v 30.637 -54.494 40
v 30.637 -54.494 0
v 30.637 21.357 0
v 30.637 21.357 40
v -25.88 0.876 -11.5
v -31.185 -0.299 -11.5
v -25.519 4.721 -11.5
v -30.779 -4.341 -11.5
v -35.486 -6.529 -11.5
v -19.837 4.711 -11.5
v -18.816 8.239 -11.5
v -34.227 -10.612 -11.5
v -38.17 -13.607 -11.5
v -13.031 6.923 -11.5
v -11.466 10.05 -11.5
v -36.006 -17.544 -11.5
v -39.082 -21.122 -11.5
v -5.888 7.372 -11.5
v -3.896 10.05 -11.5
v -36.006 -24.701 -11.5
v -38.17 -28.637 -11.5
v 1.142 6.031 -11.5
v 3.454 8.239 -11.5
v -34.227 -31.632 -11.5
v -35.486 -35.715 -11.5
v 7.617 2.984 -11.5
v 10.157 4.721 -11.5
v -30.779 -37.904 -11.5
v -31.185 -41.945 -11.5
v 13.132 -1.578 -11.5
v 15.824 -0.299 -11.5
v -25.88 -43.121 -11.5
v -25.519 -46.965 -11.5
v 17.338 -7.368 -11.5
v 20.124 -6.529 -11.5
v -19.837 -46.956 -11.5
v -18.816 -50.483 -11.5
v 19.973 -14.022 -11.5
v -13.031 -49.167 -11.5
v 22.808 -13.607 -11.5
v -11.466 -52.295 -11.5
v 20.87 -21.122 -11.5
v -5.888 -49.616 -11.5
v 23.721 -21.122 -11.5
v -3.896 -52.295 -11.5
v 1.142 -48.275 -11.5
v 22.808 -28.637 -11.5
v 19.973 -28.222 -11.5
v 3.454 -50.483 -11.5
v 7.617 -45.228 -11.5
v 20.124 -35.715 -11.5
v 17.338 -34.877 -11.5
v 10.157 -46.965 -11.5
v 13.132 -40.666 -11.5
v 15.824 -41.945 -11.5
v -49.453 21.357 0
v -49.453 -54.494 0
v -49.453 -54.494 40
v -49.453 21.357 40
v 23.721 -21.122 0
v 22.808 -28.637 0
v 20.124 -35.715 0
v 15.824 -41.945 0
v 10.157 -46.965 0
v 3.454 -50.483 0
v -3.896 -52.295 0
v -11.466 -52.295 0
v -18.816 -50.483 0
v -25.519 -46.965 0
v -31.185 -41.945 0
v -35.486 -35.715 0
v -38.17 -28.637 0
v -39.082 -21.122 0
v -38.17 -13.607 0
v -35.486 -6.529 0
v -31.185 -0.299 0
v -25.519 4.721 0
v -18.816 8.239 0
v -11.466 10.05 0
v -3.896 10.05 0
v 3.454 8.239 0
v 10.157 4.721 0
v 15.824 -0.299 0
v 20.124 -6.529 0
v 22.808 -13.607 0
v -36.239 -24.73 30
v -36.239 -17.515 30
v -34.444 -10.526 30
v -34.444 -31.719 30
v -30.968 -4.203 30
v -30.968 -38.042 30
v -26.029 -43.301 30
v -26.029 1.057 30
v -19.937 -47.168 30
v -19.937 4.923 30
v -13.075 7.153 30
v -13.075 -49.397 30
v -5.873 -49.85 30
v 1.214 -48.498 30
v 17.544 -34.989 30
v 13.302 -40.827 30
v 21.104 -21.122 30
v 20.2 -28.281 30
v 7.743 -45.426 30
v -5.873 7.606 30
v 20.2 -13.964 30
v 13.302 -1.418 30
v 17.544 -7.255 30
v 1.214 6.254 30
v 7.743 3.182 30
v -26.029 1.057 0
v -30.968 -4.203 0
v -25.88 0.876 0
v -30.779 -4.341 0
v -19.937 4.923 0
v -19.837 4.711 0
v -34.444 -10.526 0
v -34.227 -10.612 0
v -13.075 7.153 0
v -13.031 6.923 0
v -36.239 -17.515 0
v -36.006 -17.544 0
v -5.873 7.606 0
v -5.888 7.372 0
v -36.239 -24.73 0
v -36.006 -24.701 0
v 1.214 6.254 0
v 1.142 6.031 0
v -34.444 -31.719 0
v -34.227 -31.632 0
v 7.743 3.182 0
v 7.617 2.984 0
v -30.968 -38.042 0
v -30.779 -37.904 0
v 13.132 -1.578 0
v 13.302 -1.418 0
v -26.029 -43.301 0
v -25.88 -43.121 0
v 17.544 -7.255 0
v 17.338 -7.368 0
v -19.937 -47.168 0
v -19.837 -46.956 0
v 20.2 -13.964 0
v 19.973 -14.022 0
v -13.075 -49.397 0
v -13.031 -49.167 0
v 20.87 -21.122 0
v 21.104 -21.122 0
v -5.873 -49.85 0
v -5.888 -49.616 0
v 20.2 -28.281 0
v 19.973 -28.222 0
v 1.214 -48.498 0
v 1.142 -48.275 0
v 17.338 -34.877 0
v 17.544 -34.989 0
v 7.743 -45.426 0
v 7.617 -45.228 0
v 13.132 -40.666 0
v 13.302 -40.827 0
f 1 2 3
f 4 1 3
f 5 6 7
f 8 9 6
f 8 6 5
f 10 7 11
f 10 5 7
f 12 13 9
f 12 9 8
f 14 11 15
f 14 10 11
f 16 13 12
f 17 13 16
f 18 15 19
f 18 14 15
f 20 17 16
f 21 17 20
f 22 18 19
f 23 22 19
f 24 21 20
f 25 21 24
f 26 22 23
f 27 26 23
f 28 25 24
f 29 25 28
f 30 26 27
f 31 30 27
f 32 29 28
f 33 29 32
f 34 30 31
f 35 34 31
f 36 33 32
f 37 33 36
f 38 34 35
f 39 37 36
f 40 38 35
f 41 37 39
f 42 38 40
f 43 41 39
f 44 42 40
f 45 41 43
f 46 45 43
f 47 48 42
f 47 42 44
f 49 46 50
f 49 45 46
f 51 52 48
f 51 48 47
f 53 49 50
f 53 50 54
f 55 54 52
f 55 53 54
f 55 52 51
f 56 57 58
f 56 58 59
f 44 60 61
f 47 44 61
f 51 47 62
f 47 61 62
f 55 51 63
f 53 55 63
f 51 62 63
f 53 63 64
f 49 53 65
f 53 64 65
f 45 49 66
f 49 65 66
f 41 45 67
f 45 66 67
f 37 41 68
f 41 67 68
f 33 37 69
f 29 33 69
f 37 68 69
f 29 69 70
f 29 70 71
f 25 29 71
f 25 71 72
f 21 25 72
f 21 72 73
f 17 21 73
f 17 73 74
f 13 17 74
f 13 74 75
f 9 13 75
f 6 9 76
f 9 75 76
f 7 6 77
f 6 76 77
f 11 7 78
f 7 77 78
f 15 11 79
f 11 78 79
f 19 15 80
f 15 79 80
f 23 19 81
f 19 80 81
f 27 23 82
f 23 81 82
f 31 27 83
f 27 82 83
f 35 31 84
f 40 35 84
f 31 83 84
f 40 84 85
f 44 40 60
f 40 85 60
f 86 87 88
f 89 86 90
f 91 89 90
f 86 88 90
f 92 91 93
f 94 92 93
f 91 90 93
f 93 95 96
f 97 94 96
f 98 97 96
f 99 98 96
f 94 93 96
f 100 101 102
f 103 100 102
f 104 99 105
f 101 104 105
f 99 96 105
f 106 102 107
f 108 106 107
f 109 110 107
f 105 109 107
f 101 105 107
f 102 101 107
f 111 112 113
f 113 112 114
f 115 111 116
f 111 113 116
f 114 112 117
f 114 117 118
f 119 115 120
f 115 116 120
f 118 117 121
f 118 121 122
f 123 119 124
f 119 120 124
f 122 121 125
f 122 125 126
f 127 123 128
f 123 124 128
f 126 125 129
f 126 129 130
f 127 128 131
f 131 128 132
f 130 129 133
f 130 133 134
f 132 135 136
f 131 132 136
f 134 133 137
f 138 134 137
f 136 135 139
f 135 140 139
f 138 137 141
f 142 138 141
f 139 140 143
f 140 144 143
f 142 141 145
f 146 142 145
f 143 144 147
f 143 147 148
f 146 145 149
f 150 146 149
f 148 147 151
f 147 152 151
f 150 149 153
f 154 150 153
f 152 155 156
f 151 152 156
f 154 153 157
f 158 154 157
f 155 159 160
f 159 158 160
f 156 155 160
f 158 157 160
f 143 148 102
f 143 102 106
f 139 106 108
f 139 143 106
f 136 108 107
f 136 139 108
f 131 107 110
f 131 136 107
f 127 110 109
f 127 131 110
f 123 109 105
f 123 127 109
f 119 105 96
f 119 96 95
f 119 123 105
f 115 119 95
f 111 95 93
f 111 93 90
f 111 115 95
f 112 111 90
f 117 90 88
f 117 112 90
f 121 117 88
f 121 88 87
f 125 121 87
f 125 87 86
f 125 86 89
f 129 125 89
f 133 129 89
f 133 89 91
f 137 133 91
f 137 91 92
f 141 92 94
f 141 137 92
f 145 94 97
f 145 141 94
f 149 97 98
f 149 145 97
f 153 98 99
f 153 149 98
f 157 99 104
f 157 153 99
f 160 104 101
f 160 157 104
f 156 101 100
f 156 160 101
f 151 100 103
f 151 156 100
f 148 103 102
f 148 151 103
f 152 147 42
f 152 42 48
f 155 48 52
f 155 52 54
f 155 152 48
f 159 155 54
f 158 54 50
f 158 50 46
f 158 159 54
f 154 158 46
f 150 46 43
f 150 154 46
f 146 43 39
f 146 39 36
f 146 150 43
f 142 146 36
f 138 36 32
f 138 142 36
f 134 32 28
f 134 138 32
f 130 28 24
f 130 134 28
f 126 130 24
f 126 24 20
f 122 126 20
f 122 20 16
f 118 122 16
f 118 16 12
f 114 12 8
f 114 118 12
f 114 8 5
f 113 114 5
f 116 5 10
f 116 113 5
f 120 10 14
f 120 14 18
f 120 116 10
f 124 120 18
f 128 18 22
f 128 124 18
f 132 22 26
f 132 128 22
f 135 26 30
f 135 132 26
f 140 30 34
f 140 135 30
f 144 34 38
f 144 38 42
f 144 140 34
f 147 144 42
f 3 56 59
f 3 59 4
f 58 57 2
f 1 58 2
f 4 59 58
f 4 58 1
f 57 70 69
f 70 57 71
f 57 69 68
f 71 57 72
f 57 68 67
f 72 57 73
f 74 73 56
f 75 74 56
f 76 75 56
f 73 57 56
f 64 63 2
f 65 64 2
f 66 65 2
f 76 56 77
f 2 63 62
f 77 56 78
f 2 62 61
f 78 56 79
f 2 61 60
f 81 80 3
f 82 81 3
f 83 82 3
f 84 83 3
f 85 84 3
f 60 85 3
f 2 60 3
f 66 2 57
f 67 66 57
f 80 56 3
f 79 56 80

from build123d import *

# Parameters (mm, degrees)
F0_W     = 80.089839
F0_H     = 75.850955
F1_DEPTH = 40
F2_R     = 28.784991
F3_DEPTH = 30
F4_R     = 31.401524
F4_R_2   = 28.550589
F5_DEPTH = 11.5


with BuildPart() as f1:
    # F0 (on Top) → F1 (new body)
    with BuildSketch(Plane.XY):
        with Locations((-9.407865, -16.568296)):
            Rectangle(F0_W, F0_H)
    extrude(amount=F1_DEPTH)

    # F2 (on Top) → F3 (cut)
    with BuildSketch(Plane.XY):
        with Locations((-7.680858, -21.122221)):
            Circle(F2_R)
    extrude(amount=F3_DEPTH, mode=Mode.SUBTRACT)

    # F4 (on face) → F5 (join)
    with BuildSketch(Plane(origin=(0, 0, 0), x_dir=(1, 0, 0), z_dir=(0, 0, -1))):
        with Locations((-7.680858, 21.122221)):
            Circle(F4_R)
        with Locations((-7.680858, 21.122221)):
            Circle(F4_R_2, mode=Mode.SUBTRACT)
    extrude(amount=F5_DEPTH)


solid = f1.part
